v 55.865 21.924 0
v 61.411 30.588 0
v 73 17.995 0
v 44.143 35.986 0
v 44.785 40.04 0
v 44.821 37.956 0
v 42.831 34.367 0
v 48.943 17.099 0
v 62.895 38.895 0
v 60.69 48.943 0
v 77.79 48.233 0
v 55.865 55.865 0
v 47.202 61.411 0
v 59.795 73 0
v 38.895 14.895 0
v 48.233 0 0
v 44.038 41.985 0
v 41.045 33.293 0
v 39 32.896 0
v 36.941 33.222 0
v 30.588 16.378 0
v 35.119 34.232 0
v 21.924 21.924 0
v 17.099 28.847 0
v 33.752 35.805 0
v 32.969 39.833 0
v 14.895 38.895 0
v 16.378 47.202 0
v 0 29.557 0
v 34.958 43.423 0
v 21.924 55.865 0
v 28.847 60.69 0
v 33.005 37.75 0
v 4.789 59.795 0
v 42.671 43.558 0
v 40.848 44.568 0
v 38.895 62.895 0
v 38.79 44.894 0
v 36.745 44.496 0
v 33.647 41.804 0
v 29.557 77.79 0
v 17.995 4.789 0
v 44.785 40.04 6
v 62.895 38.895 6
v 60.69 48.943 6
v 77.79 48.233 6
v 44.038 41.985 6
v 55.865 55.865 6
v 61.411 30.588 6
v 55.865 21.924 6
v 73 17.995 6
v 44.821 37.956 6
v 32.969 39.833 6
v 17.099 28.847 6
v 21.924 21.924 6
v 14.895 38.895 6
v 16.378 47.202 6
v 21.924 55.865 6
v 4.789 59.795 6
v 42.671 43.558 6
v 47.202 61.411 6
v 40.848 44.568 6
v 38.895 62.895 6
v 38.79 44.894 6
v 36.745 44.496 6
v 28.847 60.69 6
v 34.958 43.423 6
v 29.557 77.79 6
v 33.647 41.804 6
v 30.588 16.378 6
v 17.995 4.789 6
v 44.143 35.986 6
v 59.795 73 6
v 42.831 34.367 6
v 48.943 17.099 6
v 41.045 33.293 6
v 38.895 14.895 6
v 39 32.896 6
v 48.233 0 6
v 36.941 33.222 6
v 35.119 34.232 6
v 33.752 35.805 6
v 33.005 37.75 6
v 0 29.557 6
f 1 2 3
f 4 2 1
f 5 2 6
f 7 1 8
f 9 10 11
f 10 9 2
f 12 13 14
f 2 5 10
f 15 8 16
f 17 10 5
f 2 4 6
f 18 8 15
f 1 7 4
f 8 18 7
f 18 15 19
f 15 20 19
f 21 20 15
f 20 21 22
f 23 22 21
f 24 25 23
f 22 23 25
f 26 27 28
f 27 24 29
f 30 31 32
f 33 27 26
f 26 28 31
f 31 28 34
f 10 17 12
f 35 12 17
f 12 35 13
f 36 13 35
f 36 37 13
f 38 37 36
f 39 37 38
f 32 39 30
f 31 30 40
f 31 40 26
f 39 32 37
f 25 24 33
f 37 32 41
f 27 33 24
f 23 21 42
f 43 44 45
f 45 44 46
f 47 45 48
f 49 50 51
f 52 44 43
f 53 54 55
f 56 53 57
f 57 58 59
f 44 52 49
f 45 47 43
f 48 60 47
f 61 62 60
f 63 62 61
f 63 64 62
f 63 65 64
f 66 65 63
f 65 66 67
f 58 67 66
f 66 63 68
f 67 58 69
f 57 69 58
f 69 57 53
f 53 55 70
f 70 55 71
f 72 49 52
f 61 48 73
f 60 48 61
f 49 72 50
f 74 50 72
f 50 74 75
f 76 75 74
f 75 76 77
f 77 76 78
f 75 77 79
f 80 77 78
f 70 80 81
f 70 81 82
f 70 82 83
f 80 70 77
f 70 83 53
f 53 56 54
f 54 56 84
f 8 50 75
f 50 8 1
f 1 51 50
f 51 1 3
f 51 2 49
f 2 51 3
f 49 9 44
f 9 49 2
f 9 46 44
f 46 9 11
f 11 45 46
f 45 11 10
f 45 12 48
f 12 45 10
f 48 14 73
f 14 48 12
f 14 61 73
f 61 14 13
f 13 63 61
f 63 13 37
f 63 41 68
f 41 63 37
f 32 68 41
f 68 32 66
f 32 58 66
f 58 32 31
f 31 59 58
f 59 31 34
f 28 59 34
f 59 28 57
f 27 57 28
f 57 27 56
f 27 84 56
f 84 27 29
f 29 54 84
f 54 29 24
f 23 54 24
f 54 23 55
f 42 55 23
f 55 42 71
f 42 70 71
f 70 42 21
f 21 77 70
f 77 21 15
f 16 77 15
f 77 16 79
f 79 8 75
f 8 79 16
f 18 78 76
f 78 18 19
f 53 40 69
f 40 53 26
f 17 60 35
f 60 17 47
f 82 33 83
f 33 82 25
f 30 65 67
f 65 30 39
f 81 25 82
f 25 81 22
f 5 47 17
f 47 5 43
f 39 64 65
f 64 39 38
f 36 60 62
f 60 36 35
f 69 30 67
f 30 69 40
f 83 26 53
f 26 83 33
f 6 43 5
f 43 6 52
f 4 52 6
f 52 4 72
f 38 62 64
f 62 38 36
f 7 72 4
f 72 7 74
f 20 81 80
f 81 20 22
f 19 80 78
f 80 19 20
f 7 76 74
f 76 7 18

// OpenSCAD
$fn = 32;

// ----------------------------------------------------------------------
// Star wheel: 8-point ratchet, R40
// ----------------------------------------------------------------------

// --- parameters (mm) ---
n_points = 8;             // number of points / teeth
r_out = 40;               // tip radius
r_in = 24;                // root radius
bore_r = 6;               // centre bore radius
plate_t = 6;              // plate thickness, Z (extrusion height)
bore_d = 12;              // centre bore diameter
fit_tol = 0.1;            // declared fit tolerance (prompt contract)
free_tol = 0.5;           // declared free tolerance (prompt contract)

profile = [[38.895, 62.895], [29.557, 77.79], [28.847, 60.69], [21.924, 55.865], [4.789, 59.795], [16.378, 47.202], [14.895, 38.895], [0, 29.557], [17.099, 28.847], [21.924, 21.924], [17.995, 4.789], [30.588, 16.378], [38.895, 14.895], [48.233, 0], [48.943, 17.099], [55.865, 21.924], [73, 17.995], [61.411, 30.588], [62.895, 38.895], [77.79, 48.233], [60.69, 48.943], [55.865, 55.865], [59.795, 73], [47.202, 61.411]];  // primary outline, 24 points, counter clockwise
void_1 = [[44.785, 40.04], [44.038, 41.985], [42.671, 43.558], [40.848, 44.568], [38.79, 44.894], [36.745, 44.496], [34.958, 43.423], [33.647, 41.804], [32.969, 39.833], [33.005, 37.75], [33.752, 35.805], [35.119, 34.232], [36.941, 33.222], [39, 32.896], [41.045, 33.293], [42.831, 34.367], [44.143, 35.986], [44.821, 37.956]];  // centre bore, 18 points

// --- the one profile operation ---
difference() {
  linear_extrude(height = plate_t) polygon(points = profile);
  translate([0, 0, -1])
    linear_extrude(height = plate_t + 2) polygon(points = void_1);
}
